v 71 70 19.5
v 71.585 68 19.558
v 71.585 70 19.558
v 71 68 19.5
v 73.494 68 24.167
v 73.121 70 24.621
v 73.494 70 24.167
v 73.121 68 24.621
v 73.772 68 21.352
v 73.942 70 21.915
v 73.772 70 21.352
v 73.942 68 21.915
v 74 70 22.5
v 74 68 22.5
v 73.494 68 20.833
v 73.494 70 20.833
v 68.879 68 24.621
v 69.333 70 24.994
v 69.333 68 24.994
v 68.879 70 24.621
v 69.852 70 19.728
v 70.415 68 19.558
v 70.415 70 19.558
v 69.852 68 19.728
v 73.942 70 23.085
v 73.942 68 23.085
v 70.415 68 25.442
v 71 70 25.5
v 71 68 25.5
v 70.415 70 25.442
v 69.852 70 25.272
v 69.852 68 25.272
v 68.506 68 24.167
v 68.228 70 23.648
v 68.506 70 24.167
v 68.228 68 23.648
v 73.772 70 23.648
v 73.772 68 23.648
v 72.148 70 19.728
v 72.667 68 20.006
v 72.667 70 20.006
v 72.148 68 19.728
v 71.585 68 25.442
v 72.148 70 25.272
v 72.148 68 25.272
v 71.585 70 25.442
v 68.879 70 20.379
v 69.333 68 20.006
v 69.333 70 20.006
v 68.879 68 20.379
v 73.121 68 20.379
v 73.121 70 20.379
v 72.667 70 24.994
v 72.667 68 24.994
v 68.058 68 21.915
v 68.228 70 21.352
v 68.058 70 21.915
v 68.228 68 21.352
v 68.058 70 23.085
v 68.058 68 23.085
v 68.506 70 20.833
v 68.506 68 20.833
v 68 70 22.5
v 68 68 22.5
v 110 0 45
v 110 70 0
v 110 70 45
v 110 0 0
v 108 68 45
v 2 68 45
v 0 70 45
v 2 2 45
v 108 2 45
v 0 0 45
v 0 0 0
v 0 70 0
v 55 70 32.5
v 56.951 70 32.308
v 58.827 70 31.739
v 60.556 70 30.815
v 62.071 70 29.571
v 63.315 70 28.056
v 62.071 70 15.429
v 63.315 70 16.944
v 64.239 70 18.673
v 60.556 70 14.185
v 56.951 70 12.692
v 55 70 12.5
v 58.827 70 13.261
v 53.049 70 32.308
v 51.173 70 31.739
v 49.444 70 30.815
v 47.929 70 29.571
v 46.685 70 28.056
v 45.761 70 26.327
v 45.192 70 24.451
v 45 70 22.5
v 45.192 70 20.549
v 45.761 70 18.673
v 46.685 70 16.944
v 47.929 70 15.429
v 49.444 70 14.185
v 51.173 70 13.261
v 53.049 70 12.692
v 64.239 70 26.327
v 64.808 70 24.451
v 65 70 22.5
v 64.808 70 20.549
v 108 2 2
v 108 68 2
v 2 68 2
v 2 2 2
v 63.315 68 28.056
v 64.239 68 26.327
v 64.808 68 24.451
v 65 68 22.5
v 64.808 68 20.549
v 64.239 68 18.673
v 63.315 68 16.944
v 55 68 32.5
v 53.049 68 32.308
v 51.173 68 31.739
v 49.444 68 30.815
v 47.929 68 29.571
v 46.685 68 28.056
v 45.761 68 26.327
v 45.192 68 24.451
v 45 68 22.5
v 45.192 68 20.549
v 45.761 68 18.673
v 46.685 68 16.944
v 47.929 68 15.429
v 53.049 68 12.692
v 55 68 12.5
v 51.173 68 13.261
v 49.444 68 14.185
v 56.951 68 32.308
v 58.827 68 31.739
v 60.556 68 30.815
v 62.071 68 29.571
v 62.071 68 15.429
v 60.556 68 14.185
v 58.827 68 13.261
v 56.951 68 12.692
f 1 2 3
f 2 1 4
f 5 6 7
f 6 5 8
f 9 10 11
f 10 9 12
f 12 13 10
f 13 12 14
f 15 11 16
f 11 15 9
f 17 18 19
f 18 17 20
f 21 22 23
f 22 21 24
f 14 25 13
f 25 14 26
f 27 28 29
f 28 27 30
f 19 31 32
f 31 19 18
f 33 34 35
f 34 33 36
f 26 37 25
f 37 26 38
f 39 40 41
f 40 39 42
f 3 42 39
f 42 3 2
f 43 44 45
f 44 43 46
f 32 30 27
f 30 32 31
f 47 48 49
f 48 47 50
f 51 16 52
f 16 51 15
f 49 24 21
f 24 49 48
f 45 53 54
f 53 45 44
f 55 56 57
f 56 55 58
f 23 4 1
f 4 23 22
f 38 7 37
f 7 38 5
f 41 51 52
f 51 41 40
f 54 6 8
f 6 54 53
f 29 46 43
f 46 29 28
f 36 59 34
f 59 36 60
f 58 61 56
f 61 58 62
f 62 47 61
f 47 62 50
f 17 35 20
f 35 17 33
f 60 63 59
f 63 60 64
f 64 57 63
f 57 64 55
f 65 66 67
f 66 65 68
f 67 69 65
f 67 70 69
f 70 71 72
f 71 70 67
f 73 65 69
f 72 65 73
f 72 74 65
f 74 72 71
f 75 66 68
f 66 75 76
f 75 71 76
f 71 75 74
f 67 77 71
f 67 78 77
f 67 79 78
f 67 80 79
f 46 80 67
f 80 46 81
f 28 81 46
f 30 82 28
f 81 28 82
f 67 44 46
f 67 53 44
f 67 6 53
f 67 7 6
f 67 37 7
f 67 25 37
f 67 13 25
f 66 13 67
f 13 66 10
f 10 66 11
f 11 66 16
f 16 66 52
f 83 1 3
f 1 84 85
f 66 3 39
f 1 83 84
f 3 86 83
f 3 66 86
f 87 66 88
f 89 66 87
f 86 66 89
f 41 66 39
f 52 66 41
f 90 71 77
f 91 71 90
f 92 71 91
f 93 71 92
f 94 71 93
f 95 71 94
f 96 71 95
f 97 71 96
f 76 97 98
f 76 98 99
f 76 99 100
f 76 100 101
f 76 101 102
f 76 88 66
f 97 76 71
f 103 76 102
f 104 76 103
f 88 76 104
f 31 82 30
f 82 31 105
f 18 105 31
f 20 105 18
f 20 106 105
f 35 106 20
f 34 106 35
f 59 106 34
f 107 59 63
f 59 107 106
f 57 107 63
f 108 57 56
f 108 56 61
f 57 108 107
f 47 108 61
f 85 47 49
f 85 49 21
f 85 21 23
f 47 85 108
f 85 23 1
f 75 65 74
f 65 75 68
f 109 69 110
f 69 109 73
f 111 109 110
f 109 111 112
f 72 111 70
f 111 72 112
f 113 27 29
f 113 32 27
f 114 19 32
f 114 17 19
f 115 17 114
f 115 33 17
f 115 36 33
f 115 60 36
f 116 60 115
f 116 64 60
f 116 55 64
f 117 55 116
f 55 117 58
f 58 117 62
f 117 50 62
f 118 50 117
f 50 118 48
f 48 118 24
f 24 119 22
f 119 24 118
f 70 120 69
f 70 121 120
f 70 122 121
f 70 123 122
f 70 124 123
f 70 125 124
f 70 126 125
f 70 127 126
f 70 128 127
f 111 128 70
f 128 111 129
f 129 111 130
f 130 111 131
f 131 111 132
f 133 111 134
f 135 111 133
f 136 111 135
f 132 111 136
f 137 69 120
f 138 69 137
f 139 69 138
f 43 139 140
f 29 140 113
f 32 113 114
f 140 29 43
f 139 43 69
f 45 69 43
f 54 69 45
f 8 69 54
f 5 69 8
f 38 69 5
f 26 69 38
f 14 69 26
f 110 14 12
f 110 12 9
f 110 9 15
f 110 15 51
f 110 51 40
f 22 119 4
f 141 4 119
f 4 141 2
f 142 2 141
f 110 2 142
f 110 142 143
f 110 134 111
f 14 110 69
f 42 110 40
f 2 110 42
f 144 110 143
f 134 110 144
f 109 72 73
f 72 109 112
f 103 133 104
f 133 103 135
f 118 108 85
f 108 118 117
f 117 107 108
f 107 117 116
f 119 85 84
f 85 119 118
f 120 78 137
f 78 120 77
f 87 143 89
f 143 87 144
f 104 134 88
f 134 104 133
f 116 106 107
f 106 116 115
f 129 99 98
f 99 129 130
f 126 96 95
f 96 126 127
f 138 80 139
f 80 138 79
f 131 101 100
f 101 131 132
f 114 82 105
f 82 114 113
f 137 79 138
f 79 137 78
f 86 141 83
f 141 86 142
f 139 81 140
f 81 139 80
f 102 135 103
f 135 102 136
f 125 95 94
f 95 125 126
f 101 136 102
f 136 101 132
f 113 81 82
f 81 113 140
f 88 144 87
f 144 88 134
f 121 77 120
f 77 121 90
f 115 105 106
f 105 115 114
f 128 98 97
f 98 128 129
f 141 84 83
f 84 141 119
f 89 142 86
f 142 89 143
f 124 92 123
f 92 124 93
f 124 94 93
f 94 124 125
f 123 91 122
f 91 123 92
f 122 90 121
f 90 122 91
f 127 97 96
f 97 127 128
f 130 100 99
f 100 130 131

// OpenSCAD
$fn = 32;

// ----------------------------------------------------------------------
// Vent box: roundvent enclosure
// ----------------------------------------------------------------------

// --- parameters (mm) ---
box_l = 110;              // box length, X
box_w = 70;               // box width, Y
box_h = 45;               // box height, Z
wall_t = 2;               // shell wall thickness
vent_d = 20;              // central vent diameter
ring_d = 6;               // ring hole diameter
n_ring = 8;               // holes in the ring
ring_r = 16;              // ring radius

ring_step = 360 / n_ring;  // ring hole angular step

difference() {
  cube([box_l, box_w, box_h]);
  translate([wall_t, wall_t, wall_t])
    cube([box_l - 2 * wall_t, box_w - 2 * wall_t, box_h]);
  translate([box_l / 2, box_w - wall_t - 1, box_h / 2])
    rotate([-90, 0, 0]) cylinder(h = wall_t + 2, d = vent_d);
  for (i = [0 : n_ring - 1])
    translate([box_l / 2, box_w - wall_t - 1, box_h / 2])
      rotate([0, 0, i * ring_step])
        translate([ring_r, 0, 0]) rotate([-90, 0, 0])
          cylinder(h = wall_t + 2, d = ring_d);
}
